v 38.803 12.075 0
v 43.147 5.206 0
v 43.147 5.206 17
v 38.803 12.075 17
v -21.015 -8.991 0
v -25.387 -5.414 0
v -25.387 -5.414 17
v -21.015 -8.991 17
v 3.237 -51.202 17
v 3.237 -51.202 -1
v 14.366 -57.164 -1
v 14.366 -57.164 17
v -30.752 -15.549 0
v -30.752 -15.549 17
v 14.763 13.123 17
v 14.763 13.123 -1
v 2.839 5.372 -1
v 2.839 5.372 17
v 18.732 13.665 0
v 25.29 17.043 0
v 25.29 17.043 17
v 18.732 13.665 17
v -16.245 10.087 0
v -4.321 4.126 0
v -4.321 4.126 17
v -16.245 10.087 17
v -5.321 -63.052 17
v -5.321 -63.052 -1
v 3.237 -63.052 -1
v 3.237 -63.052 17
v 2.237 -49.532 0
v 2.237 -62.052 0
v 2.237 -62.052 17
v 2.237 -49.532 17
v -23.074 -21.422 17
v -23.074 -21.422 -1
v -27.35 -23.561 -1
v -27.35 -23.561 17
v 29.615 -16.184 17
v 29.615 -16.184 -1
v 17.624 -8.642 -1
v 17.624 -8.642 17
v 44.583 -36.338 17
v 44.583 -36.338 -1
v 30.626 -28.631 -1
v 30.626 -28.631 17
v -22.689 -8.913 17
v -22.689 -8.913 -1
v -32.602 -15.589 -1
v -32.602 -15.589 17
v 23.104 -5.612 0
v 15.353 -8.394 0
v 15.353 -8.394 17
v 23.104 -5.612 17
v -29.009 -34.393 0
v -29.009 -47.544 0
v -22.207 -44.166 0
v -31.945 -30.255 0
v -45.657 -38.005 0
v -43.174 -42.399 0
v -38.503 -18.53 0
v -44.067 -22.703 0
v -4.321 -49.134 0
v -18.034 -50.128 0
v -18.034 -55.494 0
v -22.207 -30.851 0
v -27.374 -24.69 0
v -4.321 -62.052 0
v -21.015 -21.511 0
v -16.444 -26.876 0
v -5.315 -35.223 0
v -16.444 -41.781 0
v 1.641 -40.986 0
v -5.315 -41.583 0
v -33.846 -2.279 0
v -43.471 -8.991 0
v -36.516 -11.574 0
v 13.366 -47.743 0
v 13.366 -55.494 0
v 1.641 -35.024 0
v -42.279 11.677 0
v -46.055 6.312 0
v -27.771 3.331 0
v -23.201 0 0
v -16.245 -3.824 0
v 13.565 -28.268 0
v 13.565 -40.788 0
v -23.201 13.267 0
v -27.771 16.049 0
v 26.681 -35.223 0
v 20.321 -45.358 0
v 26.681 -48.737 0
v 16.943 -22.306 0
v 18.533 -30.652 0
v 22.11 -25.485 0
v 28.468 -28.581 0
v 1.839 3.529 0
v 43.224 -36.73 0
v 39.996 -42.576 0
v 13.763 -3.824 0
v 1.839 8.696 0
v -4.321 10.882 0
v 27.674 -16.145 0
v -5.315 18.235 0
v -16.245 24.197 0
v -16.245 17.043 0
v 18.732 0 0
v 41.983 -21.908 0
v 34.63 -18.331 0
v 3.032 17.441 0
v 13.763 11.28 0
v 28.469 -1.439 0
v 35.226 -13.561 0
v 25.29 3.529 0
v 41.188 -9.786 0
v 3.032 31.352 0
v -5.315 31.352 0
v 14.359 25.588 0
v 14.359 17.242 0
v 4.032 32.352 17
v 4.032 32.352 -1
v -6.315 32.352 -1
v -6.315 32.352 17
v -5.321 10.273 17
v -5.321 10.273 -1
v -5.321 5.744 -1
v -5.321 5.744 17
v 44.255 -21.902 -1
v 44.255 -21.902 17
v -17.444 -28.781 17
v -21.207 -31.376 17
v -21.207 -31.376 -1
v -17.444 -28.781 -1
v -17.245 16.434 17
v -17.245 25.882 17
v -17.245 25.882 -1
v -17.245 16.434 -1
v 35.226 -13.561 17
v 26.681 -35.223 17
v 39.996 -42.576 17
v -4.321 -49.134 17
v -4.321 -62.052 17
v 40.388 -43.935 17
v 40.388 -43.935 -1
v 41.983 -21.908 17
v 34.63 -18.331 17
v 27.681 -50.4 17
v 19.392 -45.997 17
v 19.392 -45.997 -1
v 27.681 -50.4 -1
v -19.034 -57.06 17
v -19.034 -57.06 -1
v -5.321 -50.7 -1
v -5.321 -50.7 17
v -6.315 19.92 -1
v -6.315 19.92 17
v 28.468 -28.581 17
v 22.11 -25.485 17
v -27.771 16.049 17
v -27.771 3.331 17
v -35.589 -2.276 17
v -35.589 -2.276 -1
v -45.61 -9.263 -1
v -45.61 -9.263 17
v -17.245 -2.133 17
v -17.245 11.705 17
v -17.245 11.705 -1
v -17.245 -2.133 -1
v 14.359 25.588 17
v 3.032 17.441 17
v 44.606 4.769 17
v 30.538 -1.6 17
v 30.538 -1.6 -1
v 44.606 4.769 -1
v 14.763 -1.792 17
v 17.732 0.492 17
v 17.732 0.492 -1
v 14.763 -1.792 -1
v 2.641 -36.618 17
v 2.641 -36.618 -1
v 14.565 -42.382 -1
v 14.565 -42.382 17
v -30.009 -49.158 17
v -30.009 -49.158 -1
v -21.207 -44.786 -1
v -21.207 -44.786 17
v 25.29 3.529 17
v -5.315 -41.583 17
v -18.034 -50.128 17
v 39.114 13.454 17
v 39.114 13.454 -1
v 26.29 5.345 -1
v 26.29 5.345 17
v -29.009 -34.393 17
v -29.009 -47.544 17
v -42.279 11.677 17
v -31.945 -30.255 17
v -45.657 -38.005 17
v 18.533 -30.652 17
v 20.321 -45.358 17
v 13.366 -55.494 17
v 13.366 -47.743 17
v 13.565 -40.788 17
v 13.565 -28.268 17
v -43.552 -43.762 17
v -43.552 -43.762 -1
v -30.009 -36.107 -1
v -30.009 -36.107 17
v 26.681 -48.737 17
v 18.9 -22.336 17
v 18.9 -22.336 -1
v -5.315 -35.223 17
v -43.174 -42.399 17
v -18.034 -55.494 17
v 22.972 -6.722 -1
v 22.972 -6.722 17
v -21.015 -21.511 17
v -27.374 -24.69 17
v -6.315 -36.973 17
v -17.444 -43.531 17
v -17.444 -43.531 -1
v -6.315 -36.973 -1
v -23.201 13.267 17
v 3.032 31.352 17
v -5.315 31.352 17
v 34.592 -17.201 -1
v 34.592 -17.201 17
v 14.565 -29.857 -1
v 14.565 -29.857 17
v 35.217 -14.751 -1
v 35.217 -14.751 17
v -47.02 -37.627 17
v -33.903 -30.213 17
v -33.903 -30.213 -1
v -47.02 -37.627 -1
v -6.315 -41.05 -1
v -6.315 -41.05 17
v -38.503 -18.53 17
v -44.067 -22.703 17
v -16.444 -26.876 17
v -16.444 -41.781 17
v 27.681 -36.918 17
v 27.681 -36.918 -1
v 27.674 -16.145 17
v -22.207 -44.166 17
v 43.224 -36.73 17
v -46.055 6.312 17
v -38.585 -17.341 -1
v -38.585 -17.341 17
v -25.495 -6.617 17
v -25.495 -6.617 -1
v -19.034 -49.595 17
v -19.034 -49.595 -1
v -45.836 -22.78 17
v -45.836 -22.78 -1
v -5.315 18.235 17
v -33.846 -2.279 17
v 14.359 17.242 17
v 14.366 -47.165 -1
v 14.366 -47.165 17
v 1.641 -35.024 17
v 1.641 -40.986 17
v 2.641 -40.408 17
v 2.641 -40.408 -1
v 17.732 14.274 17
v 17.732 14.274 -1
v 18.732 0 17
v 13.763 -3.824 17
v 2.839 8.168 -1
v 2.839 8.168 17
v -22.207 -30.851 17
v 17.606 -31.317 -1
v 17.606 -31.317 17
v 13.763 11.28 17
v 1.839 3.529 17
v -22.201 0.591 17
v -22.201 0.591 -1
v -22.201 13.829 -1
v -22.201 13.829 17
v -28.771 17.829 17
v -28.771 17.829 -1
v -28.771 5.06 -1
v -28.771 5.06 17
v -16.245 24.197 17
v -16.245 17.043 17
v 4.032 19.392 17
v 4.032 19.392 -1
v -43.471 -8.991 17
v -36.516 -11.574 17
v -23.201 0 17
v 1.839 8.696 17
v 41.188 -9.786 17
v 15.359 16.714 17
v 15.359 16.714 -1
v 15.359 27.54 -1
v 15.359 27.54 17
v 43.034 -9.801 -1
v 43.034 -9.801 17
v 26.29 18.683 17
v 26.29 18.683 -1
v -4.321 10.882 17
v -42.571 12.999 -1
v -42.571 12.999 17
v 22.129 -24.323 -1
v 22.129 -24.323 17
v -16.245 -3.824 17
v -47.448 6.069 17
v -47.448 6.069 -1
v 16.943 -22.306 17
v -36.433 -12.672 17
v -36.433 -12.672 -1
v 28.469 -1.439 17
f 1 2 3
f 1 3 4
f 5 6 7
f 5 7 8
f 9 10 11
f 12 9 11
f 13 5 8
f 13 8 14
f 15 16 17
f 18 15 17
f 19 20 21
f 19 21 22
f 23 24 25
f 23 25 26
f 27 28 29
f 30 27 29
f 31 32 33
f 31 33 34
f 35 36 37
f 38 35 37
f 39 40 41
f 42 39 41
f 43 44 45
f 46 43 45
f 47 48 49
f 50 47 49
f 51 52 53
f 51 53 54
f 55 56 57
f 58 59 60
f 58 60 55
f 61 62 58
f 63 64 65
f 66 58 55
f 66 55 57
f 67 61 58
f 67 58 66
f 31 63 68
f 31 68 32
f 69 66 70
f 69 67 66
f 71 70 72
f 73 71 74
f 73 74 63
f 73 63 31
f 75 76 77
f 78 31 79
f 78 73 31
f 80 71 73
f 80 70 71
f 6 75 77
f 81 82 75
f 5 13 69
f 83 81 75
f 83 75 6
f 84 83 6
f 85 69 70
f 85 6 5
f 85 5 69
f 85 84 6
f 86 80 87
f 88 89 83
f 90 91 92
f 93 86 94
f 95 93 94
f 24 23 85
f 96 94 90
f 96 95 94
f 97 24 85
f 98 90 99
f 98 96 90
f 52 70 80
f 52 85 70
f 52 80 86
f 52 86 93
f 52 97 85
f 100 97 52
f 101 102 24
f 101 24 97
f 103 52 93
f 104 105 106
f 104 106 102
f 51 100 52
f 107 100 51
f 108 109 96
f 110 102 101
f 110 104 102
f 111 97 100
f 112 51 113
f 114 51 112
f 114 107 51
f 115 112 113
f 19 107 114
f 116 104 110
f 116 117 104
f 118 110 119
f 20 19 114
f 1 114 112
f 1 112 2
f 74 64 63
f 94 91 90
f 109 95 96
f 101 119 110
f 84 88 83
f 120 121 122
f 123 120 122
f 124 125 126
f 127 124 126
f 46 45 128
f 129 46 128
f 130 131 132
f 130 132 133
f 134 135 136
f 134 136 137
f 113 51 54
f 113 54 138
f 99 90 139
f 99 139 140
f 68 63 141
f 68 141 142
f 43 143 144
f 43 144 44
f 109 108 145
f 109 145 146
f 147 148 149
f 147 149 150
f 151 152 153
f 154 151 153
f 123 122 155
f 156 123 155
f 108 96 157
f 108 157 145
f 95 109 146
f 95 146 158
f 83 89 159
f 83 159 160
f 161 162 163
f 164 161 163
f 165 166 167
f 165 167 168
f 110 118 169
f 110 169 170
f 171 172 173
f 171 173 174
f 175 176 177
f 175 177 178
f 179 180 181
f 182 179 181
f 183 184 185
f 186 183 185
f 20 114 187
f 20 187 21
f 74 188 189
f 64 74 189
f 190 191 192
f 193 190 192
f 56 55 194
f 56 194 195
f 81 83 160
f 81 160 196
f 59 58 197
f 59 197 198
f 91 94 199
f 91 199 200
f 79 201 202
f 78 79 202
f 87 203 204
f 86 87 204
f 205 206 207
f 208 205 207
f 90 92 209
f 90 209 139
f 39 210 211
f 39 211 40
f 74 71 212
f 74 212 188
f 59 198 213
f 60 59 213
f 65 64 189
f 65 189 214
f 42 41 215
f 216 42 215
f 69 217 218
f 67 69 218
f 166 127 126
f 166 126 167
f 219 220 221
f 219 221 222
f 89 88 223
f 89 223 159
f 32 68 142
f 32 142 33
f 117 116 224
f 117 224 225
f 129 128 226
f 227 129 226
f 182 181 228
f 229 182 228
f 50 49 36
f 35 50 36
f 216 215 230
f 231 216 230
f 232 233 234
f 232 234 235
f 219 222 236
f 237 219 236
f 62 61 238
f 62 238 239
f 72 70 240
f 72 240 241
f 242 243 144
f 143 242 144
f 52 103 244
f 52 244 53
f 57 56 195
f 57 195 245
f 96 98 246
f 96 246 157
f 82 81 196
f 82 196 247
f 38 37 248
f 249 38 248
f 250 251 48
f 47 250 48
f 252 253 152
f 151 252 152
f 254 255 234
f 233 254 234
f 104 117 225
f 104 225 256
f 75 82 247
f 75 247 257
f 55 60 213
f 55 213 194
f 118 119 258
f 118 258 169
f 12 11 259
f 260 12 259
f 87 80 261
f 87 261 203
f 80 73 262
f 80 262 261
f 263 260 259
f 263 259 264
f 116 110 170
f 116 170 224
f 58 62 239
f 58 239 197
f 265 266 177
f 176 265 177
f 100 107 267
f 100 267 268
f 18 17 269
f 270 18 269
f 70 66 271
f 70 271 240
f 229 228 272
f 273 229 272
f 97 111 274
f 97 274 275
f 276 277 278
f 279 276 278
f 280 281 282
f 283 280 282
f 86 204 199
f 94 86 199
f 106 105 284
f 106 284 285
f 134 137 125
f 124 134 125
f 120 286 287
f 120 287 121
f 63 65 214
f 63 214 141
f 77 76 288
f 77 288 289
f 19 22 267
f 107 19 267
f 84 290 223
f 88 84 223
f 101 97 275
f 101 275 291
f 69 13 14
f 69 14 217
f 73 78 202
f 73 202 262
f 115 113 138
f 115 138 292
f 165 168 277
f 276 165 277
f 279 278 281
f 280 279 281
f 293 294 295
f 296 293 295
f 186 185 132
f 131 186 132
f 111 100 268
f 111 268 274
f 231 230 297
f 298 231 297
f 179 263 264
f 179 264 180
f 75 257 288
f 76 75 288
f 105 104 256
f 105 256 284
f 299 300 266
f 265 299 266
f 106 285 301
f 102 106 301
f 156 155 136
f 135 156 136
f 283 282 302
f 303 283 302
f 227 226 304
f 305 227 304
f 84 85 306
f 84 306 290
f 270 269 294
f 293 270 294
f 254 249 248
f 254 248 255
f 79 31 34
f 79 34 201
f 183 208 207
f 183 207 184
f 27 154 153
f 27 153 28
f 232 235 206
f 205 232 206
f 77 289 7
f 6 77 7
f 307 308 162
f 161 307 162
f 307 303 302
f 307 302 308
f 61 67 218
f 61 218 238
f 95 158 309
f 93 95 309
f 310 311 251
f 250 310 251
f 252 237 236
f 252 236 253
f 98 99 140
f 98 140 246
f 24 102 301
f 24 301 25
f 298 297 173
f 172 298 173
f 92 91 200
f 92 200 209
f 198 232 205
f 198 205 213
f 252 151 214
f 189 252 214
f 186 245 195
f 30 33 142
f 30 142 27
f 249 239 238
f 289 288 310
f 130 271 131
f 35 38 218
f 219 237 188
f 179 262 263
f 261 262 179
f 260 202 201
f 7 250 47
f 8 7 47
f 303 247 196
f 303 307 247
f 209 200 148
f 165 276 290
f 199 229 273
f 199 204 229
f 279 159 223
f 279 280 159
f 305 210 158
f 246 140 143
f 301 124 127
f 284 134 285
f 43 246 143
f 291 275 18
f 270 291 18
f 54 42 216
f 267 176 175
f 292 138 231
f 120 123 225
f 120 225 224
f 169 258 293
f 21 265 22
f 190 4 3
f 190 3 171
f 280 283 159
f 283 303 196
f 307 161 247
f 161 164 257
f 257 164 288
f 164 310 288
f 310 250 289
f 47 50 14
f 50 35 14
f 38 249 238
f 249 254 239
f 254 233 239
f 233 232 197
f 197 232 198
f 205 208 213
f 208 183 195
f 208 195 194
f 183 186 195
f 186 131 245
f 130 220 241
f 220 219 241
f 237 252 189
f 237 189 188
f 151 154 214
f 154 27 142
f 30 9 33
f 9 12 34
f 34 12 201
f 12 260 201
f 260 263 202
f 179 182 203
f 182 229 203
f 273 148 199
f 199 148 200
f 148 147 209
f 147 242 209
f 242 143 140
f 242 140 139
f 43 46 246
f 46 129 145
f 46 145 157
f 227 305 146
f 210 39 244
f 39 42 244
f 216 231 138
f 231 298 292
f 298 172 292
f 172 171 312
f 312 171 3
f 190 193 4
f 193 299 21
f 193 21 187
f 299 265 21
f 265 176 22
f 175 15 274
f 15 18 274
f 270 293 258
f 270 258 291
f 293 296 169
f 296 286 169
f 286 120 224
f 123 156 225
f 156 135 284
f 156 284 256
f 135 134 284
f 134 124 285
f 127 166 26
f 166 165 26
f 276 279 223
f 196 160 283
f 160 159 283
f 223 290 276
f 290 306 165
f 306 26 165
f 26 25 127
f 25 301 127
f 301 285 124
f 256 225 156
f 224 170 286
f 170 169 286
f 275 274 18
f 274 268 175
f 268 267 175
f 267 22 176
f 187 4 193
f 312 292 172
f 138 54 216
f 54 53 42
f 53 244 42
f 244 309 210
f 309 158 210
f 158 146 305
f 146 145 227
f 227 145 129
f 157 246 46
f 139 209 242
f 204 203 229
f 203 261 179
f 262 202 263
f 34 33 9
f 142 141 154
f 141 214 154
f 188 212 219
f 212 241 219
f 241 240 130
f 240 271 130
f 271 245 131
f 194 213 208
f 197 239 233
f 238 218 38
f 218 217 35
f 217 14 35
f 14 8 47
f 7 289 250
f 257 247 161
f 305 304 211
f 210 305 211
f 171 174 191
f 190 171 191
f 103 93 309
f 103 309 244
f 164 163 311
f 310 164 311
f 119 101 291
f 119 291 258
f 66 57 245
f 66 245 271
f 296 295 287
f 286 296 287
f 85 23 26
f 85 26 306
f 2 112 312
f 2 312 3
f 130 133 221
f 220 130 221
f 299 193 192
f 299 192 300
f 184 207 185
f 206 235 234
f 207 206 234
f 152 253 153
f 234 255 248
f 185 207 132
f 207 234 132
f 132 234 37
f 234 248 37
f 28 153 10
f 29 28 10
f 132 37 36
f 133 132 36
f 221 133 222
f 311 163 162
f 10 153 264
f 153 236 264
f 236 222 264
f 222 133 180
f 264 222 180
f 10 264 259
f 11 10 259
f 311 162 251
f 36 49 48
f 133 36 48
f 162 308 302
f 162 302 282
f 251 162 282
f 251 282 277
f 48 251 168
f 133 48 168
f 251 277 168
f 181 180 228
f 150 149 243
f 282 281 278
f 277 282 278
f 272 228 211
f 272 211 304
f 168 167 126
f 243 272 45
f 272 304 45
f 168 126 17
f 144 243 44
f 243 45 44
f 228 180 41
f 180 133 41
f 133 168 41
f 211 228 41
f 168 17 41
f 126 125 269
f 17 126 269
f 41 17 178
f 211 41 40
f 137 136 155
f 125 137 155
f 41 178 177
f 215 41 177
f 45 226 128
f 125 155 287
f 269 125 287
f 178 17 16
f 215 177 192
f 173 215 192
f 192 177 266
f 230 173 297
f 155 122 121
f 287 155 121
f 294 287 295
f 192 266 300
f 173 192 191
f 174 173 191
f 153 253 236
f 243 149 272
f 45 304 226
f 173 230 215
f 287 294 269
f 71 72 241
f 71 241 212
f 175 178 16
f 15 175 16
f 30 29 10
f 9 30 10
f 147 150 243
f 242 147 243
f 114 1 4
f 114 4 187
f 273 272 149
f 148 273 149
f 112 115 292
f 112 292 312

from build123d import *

# Parameters (mm, degrees)
F1_DEPTH = 17
F2_T     = 1


with BuildPart() as f1:
    # F0 (on Top) → F1 (new body)
    with BuildSketch(Plane.XY):
        Polygon((-27.7714431286, 3.3306172118), (-42.2787889838, 11.6773098707), (-46.0546761751, 6.3115782104), (-33.8464085439, -2.2794293716), (-43.471172452, -8.9906910434), (-36.515597254, -11.5741910413), (-25.3866743296, -5.4135369137), (-21.0145972669, -8.9906910434), (-30.7524055243, -15.5488057062), (-21.0145972669, -21.5107295662), (-27.3739825934, -24.6904212981), (-38.5029055178, -18.5297690332), (-44.0673679113, -22.703114897), (-31.9447889924, -30.2548836917), (-45.6572137773, -38.0053855479), (-43.173648768, -42.3993846747), (-29.0093820945, -34.3934938956), (-29.0093820945, -47.5444607437), (-22.2069825977, -44.1660396755), (-22.2069825977, -30.8510754257), (-16.4437890053, -26.8764607608), (-16.4437890053, -41.7812690139), (-5.3148670122, -35.2231524885), (-5.3148670122, -41.5825396776), (-18.0336348712, -50.1279607415), (-18.0336348712, -55.4936937988), (-4.3212124147, -49.1343066096), (-4.3212124147, -62.0518065989), (2.2369034123, -62.0518065989), (2.2369034123, -49.5317690074), (13.3658256382, -55.4936937988), (13.3658256382, -47.7431900799), (1.6407109797, -40.9863442183), (1.6407109797, -35.0244231522), (13.5645577684, -40.787614882), (13.5645577684, -28.2675754279), (18.5328256339, -30.6523460895), (20.3214026988, -45.3584231436), (26.6807861626, -48.7368442118), (26.6807861626, -35.2231524885), (39.9957485497, -42.5761900842), (43.2241563976, -36.7301531906), (28.4681427782, -28.5813113274), (41.9830568135, -21.908191964), (34.6300154924, -18.3310378343), (22.1099797636, -25.4853442311), (16.9429797679, -22.3056524992), (27.6744421571, -16.1449983716), (15.3531348333, -8.394498378), (23.1036357582, -5.6122676469), (35.2262109518, -13.5614983737), (41.1881357431, -9.7856139764), (28.4693632275, -1.4389213175), (43.1467061942, 5.2062330151), (38.8033650815, 12.0747713372), (25.2896733582, 3.5293472465), (25.2896733582, 17.0430392027), (18.7315568328, 13.6646172032), (18.7315568328, 0), (13.7632861733, -3.8236908149), (13.7632861733, 11.2798474729), (1.8394411309, 3.5293472465), (1.8394411309, 8.6963474751), (14.3594788387, 17.2417722642), (14.3594788387, 25.5884621292), (3.0318258796, 17.4405016005), (3.0318258796, 31.3516557217), (-5.3148670122, 31.3516557217), (-5.3148670122, 18.2354263961), (-16.2450578064, 24.1973474622), (-16.2450578064, 17.0430392027), (-4.3212124147, 10.8823850751), (-4.3212124147, 4.1255401447), (-16.2450578064, 10.0874630734), (-16.2450578064, -3.8236908149), (-23.2006367296, 0), (-23.2006367296, 13.2671557367), (-27.7714431286, 16.0493850708), align=None)
    extrude(amount=F1_DEPTH)

    # F2
    f2_openings = [f1.faces().sort_by_distance(p)[0] for p in [
        (-0.933502, -15.354262, 17),
    ]]
    offset(amount=F2_T, openings=f2_openings, kind=Kind.INTERSECTION)


solid = f1.part
